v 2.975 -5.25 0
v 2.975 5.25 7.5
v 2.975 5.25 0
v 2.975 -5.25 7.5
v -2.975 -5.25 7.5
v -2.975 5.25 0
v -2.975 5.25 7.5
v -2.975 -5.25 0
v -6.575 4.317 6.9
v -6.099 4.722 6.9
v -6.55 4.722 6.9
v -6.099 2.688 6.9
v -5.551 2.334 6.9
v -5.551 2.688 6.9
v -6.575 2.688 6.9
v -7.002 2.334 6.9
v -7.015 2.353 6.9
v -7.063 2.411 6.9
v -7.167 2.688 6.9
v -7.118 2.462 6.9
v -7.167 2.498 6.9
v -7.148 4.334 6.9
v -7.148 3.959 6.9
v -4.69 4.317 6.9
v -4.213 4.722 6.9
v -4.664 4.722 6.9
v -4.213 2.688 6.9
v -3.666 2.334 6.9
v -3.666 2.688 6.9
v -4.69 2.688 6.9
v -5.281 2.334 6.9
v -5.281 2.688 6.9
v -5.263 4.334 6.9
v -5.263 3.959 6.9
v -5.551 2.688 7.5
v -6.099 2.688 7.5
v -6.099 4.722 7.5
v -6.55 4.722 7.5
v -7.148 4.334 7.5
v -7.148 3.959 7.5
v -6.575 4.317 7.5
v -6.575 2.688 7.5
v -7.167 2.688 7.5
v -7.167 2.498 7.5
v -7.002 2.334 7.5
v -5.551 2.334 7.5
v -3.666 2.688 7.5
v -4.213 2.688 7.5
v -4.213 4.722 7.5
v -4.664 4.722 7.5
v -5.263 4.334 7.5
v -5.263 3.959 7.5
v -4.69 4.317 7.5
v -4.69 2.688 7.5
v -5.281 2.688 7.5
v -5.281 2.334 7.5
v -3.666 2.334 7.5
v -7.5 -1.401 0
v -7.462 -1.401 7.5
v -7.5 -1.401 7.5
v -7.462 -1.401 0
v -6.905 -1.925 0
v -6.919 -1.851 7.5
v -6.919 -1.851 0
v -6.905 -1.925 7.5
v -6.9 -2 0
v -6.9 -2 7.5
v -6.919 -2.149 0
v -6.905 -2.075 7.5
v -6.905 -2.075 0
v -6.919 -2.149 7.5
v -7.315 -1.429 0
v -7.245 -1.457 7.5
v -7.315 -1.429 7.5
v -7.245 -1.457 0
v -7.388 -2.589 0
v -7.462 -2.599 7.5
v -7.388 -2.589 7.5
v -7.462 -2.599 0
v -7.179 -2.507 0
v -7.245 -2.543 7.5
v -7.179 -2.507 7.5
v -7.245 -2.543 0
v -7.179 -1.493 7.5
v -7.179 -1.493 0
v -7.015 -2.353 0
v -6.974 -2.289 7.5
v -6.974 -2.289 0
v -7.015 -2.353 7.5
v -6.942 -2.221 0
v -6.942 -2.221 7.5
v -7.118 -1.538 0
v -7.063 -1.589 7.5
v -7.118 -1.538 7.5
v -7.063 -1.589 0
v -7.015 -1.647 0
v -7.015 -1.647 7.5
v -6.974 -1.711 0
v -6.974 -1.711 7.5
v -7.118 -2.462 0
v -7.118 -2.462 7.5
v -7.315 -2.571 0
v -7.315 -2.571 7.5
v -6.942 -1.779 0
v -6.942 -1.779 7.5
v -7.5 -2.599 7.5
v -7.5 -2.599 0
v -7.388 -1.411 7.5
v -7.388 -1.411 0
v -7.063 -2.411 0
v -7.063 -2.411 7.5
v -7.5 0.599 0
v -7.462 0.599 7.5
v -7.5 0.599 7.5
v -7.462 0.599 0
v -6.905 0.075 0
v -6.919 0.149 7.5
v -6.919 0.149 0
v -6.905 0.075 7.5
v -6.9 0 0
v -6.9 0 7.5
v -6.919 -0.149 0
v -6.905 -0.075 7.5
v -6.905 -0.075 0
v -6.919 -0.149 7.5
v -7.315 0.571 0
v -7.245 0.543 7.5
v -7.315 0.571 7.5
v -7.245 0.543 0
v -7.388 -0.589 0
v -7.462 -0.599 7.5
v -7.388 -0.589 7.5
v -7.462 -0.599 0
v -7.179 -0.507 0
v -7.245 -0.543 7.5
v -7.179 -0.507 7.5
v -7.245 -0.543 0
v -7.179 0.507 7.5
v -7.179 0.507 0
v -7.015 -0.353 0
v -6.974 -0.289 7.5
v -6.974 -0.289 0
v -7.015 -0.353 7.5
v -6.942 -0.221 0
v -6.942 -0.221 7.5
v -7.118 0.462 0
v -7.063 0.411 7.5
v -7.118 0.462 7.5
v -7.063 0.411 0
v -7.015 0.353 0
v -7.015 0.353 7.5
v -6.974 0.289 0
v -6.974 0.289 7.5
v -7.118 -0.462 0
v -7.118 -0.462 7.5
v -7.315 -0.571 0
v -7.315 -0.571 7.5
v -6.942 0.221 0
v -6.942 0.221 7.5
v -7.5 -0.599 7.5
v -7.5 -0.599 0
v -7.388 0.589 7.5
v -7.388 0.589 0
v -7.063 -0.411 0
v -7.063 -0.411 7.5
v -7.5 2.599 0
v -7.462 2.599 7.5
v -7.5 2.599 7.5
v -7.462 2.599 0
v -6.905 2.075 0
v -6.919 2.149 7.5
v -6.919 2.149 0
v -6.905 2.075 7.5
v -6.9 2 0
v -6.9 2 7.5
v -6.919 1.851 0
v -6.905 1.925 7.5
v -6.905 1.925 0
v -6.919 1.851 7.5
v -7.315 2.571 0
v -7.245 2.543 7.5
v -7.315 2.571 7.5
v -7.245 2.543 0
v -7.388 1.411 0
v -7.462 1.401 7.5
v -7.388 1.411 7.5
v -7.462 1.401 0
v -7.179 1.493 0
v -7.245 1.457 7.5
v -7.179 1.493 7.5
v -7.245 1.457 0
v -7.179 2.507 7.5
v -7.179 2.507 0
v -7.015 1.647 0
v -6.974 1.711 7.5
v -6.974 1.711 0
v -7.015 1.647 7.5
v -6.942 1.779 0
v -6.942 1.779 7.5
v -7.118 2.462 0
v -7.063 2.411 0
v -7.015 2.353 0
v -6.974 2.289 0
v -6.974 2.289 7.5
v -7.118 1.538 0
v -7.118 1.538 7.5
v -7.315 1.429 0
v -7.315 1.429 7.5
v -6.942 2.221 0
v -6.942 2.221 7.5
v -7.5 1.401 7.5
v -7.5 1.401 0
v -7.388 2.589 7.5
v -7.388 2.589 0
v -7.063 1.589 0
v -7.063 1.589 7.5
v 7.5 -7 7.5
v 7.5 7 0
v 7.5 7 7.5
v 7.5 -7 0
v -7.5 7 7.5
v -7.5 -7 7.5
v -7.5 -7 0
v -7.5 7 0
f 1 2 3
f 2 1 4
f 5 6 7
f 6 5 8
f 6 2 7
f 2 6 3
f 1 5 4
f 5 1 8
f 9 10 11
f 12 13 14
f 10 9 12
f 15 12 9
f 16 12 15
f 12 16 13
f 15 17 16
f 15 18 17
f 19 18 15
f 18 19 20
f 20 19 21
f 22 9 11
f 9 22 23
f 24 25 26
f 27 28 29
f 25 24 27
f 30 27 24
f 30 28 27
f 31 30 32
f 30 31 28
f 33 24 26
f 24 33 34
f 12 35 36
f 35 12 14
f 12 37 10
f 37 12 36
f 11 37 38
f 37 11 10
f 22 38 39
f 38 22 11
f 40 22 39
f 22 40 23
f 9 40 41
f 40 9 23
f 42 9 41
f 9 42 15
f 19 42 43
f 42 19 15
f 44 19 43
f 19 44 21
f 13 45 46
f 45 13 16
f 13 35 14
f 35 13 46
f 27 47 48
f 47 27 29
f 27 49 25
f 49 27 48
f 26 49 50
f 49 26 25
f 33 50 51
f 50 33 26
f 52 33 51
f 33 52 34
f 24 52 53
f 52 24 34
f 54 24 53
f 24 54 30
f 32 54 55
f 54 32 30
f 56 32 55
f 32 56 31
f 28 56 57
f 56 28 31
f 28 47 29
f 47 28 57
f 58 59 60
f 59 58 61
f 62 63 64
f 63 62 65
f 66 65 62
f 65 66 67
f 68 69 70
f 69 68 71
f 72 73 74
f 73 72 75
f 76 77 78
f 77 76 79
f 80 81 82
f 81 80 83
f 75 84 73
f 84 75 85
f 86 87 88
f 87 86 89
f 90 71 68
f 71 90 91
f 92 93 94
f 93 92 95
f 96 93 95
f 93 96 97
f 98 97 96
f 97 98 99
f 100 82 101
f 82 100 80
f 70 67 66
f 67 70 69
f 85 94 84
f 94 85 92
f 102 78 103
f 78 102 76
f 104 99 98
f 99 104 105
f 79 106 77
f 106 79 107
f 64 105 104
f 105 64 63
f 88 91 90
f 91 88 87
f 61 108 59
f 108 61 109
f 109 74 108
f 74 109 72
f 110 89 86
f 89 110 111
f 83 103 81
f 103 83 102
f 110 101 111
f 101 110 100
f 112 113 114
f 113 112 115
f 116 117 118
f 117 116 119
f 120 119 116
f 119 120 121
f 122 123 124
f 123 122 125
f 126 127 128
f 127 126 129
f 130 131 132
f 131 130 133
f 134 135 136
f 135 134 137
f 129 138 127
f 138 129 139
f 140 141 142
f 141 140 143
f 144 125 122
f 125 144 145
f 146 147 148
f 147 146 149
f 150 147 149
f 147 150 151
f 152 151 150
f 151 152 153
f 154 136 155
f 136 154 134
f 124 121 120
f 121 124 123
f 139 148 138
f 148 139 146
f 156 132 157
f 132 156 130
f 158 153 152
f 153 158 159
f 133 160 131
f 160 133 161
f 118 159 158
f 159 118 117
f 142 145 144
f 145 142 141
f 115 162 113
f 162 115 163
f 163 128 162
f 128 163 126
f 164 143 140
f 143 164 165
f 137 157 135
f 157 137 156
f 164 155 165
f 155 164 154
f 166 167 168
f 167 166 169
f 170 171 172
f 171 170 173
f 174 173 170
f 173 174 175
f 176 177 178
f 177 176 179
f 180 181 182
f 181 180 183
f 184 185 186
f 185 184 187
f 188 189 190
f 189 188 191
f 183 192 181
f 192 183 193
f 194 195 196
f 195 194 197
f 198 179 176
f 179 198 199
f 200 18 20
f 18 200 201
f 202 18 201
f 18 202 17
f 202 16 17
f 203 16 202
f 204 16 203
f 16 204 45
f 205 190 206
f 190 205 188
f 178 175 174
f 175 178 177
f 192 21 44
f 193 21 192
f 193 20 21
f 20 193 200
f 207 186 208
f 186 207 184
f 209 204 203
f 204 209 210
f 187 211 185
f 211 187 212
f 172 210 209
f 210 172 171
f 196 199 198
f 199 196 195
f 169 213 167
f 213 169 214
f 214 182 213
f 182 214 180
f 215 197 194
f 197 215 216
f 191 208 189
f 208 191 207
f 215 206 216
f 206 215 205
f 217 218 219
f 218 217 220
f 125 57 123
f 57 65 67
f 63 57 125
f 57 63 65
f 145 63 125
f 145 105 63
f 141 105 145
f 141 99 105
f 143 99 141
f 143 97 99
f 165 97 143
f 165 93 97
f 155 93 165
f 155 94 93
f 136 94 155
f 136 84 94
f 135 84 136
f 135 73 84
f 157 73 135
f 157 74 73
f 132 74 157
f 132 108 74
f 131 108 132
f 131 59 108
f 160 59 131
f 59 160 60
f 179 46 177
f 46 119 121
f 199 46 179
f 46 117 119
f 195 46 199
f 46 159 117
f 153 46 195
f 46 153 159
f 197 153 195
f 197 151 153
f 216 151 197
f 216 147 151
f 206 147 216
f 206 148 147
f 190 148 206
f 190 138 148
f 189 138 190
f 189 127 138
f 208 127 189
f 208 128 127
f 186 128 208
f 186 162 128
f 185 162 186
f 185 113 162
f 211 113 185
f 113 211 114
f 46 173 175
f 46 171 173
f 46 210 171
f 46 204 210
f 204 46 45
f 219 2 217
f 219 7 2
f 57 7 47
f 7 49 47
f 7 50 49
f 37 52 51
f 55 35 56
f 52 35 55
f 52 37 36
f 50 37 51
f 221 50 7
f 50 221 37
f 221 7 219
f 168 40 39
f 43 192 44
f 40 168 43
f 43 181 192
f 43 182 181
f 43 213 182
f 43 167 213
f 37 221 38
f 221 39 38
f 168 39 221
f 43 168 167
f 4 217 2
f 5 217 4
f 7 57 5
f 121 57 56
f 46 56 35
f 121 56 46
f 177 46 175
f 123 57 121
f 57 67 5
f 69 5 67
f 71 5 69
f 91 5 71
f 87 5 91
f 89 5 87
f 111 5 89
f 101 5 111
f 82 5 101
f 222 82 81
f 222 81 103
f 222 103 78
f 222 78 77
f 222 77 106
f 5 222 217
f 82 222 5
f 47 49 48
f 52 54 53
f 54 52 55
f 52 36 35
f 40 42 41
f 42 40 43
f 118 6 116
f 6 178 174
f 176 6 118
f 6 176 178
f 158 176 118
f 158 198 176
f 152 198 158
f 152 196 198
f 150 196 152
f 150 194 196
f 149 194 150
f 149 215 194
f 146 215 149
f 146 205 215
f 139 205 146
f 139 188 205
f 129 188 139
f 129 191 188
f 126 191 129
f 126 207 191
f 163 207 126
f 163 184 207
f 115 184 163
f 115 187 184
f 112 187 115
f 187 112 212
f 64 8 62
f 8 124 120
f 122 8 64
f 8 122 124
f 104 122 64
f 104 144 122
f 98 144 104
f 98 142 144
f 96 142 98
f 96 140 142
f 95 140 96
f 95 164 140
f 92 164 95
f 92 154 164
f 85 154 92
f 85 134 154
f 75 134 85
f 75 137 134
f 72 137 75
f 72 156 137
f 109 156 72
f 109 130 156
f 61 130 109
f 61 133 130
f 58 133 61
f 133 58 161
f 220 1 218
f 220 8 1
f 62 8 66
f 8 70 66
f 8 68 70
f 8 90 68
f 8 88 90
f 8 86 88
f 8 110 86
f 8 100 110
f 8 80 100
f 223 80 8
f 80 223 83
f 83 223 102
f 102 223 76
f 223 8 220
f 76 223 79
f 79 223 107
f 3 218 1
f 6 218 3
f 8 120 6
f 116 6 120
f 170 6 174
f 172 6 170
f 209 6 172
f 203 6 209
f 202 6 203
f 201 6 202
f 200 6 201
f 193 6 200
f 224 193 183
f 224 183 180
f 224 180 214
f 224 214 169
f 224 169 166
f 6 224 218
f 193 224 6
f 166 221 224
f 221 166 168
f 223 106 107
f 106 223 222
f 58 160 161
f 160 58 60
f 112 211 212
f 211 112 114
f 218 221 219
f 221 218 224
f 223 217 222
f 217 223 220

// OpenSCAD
$fn = 50;

difference() {
	union() {
		translate(v = [0, -5, 0]) {
			rotate(a = [0, 0, 0]) {
				difference() {
					union() {
						translate(v = [-7.5, -2.0, 0]) {
							cube(size = [15.0, 14.0, 7.5]);
						}
					}
					union() {
						translate(v = [-2.975, -0.25, -0.1]) {
							cube(size = [5.95, 10.5, 7.7]);
						}
						translate(v = [-5.5, 8.5, 6.9]) {
							linear_extrude(height = 0.7) {
								text(font = "Arial:style=Bold", halign = "center", size = 2.5, text = "11", valign = "center");
							}
						}
						translate(v = [-7.5, 3, -0.1]) {
							cylinder(h = 7.7, r = 0.6);
						}
						translate(v = [-7.5, 5, -0.1]) {
							cylinder(h = 7.7, r = 0.6);
						}
						translate(v = [-7.5, 7, -0.1]) {
							cylinder(h = 7.7, r = 0.6);
						}
					}
				}
			}
		}
	}
	union();
}
